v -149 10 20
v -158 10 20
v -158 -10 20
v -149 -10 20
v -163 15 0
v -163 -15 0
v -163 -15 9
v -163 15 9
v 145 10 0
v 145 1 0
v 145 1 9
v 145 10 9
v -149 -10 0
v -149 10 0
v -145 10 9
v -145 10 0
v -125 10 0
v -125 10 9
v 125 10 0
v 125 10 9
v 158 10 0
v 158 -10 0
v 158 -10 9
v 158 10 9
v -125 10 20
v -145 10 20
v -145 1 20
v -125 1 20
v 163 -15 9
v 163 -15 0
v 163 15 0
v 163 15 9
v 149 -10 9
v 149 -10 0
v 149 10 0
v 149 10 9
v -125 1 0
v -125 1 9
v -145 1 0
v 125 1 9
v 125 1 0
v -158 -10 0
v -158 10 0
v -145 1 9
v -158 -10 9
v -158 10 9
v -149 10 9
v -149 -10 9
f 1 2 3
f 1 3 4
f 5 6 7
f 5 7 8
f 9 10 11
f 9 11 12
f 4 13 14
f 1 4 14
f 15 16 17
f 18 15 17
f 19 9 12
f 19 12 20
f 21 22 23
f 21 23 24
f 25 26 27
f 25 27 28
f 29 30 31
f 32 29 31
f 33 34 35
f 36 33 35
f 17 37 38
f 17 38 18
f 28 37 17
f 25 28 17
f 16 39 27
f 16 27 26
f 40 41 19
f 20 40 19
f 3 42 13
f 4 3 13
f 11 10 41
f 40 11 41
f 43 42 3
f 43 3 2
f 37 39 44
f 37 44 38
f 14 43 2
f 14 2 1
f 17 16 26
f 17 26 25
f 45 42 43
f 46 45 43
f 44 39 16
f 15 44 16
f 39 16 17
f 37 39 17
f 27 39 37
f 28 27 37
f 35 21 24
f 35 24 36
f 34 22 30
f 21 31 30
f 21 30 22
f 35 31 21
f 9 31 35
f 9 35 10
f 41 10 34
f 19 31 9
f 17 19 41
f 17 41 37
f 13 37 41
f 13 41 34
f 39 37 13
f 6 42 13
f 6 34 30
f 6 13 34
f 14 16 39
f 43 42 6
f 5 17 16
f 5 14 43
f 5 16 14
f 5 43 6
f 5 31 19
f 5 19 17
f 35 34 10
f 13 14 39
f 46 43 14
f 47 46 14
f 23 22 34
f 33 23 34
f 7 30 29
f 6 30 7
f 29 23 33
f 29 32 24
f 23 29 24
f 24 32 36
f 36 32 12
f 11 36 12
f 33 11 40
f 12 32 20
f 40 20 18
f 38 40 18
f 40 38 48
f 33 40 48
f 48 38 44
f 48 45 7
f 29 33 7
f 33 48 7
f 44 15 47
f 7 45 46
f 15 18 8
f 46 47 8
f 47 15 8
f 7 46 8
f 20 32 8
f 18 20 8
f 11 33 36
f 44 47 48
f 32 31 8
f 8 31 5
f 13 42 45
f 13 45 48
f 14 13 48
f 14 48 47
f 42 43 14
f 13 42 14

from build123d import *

# Parameters (mm, degrees)
F0_W     = 163
F0_H     = 30
F0_W_2   = 9
F0_H_2   = 20
F0_W_3   = 20
F0_H_3   = 9
F1_DEPTH = 9
F2_DEPTH = 20


with BuildPart() as f1:
    # F0 (on Top) → F1 (new body)
    with BuildSketch(Plane.XY):
        with Locations((-81.5, 0)):
            Rectangle(F0_W, F0_H)
        with Locations((-153.5, 0)):
            Rectangle(F0_W_2, F0_H_2, mode=Mode.SUBTRACT)
        with Locations((-135, 5.5)):
            Rectangle(F0_W_3, F0_H_3, mode=Mode.SUBTRACT)
    extrude(amount=F1_DEPTH)

    # F3: F1 across face


with BuildPart() as f2:
    # F0 (on Top) → F2 (new body)
    with BuildSketch(Plane.XY):
        with Locations((-153.5, 0)):
            Rectangle(F0_W_2, F0_H_2)
        with Locations((-135, 5.5)):
            Rectangle(F0_W_3, F0_H_3)
    extrude(amount=F2_DEPTH)


with BuildPart() as f1_1:
    add(f1.part)
    add(f1.part.mirror(Plane(origin=(0, 0, 4.5), x_dir=(0, 1, 0), z_dir=(1, 0, 0))))


solid = Compound([f2.part, f1_1.part])
